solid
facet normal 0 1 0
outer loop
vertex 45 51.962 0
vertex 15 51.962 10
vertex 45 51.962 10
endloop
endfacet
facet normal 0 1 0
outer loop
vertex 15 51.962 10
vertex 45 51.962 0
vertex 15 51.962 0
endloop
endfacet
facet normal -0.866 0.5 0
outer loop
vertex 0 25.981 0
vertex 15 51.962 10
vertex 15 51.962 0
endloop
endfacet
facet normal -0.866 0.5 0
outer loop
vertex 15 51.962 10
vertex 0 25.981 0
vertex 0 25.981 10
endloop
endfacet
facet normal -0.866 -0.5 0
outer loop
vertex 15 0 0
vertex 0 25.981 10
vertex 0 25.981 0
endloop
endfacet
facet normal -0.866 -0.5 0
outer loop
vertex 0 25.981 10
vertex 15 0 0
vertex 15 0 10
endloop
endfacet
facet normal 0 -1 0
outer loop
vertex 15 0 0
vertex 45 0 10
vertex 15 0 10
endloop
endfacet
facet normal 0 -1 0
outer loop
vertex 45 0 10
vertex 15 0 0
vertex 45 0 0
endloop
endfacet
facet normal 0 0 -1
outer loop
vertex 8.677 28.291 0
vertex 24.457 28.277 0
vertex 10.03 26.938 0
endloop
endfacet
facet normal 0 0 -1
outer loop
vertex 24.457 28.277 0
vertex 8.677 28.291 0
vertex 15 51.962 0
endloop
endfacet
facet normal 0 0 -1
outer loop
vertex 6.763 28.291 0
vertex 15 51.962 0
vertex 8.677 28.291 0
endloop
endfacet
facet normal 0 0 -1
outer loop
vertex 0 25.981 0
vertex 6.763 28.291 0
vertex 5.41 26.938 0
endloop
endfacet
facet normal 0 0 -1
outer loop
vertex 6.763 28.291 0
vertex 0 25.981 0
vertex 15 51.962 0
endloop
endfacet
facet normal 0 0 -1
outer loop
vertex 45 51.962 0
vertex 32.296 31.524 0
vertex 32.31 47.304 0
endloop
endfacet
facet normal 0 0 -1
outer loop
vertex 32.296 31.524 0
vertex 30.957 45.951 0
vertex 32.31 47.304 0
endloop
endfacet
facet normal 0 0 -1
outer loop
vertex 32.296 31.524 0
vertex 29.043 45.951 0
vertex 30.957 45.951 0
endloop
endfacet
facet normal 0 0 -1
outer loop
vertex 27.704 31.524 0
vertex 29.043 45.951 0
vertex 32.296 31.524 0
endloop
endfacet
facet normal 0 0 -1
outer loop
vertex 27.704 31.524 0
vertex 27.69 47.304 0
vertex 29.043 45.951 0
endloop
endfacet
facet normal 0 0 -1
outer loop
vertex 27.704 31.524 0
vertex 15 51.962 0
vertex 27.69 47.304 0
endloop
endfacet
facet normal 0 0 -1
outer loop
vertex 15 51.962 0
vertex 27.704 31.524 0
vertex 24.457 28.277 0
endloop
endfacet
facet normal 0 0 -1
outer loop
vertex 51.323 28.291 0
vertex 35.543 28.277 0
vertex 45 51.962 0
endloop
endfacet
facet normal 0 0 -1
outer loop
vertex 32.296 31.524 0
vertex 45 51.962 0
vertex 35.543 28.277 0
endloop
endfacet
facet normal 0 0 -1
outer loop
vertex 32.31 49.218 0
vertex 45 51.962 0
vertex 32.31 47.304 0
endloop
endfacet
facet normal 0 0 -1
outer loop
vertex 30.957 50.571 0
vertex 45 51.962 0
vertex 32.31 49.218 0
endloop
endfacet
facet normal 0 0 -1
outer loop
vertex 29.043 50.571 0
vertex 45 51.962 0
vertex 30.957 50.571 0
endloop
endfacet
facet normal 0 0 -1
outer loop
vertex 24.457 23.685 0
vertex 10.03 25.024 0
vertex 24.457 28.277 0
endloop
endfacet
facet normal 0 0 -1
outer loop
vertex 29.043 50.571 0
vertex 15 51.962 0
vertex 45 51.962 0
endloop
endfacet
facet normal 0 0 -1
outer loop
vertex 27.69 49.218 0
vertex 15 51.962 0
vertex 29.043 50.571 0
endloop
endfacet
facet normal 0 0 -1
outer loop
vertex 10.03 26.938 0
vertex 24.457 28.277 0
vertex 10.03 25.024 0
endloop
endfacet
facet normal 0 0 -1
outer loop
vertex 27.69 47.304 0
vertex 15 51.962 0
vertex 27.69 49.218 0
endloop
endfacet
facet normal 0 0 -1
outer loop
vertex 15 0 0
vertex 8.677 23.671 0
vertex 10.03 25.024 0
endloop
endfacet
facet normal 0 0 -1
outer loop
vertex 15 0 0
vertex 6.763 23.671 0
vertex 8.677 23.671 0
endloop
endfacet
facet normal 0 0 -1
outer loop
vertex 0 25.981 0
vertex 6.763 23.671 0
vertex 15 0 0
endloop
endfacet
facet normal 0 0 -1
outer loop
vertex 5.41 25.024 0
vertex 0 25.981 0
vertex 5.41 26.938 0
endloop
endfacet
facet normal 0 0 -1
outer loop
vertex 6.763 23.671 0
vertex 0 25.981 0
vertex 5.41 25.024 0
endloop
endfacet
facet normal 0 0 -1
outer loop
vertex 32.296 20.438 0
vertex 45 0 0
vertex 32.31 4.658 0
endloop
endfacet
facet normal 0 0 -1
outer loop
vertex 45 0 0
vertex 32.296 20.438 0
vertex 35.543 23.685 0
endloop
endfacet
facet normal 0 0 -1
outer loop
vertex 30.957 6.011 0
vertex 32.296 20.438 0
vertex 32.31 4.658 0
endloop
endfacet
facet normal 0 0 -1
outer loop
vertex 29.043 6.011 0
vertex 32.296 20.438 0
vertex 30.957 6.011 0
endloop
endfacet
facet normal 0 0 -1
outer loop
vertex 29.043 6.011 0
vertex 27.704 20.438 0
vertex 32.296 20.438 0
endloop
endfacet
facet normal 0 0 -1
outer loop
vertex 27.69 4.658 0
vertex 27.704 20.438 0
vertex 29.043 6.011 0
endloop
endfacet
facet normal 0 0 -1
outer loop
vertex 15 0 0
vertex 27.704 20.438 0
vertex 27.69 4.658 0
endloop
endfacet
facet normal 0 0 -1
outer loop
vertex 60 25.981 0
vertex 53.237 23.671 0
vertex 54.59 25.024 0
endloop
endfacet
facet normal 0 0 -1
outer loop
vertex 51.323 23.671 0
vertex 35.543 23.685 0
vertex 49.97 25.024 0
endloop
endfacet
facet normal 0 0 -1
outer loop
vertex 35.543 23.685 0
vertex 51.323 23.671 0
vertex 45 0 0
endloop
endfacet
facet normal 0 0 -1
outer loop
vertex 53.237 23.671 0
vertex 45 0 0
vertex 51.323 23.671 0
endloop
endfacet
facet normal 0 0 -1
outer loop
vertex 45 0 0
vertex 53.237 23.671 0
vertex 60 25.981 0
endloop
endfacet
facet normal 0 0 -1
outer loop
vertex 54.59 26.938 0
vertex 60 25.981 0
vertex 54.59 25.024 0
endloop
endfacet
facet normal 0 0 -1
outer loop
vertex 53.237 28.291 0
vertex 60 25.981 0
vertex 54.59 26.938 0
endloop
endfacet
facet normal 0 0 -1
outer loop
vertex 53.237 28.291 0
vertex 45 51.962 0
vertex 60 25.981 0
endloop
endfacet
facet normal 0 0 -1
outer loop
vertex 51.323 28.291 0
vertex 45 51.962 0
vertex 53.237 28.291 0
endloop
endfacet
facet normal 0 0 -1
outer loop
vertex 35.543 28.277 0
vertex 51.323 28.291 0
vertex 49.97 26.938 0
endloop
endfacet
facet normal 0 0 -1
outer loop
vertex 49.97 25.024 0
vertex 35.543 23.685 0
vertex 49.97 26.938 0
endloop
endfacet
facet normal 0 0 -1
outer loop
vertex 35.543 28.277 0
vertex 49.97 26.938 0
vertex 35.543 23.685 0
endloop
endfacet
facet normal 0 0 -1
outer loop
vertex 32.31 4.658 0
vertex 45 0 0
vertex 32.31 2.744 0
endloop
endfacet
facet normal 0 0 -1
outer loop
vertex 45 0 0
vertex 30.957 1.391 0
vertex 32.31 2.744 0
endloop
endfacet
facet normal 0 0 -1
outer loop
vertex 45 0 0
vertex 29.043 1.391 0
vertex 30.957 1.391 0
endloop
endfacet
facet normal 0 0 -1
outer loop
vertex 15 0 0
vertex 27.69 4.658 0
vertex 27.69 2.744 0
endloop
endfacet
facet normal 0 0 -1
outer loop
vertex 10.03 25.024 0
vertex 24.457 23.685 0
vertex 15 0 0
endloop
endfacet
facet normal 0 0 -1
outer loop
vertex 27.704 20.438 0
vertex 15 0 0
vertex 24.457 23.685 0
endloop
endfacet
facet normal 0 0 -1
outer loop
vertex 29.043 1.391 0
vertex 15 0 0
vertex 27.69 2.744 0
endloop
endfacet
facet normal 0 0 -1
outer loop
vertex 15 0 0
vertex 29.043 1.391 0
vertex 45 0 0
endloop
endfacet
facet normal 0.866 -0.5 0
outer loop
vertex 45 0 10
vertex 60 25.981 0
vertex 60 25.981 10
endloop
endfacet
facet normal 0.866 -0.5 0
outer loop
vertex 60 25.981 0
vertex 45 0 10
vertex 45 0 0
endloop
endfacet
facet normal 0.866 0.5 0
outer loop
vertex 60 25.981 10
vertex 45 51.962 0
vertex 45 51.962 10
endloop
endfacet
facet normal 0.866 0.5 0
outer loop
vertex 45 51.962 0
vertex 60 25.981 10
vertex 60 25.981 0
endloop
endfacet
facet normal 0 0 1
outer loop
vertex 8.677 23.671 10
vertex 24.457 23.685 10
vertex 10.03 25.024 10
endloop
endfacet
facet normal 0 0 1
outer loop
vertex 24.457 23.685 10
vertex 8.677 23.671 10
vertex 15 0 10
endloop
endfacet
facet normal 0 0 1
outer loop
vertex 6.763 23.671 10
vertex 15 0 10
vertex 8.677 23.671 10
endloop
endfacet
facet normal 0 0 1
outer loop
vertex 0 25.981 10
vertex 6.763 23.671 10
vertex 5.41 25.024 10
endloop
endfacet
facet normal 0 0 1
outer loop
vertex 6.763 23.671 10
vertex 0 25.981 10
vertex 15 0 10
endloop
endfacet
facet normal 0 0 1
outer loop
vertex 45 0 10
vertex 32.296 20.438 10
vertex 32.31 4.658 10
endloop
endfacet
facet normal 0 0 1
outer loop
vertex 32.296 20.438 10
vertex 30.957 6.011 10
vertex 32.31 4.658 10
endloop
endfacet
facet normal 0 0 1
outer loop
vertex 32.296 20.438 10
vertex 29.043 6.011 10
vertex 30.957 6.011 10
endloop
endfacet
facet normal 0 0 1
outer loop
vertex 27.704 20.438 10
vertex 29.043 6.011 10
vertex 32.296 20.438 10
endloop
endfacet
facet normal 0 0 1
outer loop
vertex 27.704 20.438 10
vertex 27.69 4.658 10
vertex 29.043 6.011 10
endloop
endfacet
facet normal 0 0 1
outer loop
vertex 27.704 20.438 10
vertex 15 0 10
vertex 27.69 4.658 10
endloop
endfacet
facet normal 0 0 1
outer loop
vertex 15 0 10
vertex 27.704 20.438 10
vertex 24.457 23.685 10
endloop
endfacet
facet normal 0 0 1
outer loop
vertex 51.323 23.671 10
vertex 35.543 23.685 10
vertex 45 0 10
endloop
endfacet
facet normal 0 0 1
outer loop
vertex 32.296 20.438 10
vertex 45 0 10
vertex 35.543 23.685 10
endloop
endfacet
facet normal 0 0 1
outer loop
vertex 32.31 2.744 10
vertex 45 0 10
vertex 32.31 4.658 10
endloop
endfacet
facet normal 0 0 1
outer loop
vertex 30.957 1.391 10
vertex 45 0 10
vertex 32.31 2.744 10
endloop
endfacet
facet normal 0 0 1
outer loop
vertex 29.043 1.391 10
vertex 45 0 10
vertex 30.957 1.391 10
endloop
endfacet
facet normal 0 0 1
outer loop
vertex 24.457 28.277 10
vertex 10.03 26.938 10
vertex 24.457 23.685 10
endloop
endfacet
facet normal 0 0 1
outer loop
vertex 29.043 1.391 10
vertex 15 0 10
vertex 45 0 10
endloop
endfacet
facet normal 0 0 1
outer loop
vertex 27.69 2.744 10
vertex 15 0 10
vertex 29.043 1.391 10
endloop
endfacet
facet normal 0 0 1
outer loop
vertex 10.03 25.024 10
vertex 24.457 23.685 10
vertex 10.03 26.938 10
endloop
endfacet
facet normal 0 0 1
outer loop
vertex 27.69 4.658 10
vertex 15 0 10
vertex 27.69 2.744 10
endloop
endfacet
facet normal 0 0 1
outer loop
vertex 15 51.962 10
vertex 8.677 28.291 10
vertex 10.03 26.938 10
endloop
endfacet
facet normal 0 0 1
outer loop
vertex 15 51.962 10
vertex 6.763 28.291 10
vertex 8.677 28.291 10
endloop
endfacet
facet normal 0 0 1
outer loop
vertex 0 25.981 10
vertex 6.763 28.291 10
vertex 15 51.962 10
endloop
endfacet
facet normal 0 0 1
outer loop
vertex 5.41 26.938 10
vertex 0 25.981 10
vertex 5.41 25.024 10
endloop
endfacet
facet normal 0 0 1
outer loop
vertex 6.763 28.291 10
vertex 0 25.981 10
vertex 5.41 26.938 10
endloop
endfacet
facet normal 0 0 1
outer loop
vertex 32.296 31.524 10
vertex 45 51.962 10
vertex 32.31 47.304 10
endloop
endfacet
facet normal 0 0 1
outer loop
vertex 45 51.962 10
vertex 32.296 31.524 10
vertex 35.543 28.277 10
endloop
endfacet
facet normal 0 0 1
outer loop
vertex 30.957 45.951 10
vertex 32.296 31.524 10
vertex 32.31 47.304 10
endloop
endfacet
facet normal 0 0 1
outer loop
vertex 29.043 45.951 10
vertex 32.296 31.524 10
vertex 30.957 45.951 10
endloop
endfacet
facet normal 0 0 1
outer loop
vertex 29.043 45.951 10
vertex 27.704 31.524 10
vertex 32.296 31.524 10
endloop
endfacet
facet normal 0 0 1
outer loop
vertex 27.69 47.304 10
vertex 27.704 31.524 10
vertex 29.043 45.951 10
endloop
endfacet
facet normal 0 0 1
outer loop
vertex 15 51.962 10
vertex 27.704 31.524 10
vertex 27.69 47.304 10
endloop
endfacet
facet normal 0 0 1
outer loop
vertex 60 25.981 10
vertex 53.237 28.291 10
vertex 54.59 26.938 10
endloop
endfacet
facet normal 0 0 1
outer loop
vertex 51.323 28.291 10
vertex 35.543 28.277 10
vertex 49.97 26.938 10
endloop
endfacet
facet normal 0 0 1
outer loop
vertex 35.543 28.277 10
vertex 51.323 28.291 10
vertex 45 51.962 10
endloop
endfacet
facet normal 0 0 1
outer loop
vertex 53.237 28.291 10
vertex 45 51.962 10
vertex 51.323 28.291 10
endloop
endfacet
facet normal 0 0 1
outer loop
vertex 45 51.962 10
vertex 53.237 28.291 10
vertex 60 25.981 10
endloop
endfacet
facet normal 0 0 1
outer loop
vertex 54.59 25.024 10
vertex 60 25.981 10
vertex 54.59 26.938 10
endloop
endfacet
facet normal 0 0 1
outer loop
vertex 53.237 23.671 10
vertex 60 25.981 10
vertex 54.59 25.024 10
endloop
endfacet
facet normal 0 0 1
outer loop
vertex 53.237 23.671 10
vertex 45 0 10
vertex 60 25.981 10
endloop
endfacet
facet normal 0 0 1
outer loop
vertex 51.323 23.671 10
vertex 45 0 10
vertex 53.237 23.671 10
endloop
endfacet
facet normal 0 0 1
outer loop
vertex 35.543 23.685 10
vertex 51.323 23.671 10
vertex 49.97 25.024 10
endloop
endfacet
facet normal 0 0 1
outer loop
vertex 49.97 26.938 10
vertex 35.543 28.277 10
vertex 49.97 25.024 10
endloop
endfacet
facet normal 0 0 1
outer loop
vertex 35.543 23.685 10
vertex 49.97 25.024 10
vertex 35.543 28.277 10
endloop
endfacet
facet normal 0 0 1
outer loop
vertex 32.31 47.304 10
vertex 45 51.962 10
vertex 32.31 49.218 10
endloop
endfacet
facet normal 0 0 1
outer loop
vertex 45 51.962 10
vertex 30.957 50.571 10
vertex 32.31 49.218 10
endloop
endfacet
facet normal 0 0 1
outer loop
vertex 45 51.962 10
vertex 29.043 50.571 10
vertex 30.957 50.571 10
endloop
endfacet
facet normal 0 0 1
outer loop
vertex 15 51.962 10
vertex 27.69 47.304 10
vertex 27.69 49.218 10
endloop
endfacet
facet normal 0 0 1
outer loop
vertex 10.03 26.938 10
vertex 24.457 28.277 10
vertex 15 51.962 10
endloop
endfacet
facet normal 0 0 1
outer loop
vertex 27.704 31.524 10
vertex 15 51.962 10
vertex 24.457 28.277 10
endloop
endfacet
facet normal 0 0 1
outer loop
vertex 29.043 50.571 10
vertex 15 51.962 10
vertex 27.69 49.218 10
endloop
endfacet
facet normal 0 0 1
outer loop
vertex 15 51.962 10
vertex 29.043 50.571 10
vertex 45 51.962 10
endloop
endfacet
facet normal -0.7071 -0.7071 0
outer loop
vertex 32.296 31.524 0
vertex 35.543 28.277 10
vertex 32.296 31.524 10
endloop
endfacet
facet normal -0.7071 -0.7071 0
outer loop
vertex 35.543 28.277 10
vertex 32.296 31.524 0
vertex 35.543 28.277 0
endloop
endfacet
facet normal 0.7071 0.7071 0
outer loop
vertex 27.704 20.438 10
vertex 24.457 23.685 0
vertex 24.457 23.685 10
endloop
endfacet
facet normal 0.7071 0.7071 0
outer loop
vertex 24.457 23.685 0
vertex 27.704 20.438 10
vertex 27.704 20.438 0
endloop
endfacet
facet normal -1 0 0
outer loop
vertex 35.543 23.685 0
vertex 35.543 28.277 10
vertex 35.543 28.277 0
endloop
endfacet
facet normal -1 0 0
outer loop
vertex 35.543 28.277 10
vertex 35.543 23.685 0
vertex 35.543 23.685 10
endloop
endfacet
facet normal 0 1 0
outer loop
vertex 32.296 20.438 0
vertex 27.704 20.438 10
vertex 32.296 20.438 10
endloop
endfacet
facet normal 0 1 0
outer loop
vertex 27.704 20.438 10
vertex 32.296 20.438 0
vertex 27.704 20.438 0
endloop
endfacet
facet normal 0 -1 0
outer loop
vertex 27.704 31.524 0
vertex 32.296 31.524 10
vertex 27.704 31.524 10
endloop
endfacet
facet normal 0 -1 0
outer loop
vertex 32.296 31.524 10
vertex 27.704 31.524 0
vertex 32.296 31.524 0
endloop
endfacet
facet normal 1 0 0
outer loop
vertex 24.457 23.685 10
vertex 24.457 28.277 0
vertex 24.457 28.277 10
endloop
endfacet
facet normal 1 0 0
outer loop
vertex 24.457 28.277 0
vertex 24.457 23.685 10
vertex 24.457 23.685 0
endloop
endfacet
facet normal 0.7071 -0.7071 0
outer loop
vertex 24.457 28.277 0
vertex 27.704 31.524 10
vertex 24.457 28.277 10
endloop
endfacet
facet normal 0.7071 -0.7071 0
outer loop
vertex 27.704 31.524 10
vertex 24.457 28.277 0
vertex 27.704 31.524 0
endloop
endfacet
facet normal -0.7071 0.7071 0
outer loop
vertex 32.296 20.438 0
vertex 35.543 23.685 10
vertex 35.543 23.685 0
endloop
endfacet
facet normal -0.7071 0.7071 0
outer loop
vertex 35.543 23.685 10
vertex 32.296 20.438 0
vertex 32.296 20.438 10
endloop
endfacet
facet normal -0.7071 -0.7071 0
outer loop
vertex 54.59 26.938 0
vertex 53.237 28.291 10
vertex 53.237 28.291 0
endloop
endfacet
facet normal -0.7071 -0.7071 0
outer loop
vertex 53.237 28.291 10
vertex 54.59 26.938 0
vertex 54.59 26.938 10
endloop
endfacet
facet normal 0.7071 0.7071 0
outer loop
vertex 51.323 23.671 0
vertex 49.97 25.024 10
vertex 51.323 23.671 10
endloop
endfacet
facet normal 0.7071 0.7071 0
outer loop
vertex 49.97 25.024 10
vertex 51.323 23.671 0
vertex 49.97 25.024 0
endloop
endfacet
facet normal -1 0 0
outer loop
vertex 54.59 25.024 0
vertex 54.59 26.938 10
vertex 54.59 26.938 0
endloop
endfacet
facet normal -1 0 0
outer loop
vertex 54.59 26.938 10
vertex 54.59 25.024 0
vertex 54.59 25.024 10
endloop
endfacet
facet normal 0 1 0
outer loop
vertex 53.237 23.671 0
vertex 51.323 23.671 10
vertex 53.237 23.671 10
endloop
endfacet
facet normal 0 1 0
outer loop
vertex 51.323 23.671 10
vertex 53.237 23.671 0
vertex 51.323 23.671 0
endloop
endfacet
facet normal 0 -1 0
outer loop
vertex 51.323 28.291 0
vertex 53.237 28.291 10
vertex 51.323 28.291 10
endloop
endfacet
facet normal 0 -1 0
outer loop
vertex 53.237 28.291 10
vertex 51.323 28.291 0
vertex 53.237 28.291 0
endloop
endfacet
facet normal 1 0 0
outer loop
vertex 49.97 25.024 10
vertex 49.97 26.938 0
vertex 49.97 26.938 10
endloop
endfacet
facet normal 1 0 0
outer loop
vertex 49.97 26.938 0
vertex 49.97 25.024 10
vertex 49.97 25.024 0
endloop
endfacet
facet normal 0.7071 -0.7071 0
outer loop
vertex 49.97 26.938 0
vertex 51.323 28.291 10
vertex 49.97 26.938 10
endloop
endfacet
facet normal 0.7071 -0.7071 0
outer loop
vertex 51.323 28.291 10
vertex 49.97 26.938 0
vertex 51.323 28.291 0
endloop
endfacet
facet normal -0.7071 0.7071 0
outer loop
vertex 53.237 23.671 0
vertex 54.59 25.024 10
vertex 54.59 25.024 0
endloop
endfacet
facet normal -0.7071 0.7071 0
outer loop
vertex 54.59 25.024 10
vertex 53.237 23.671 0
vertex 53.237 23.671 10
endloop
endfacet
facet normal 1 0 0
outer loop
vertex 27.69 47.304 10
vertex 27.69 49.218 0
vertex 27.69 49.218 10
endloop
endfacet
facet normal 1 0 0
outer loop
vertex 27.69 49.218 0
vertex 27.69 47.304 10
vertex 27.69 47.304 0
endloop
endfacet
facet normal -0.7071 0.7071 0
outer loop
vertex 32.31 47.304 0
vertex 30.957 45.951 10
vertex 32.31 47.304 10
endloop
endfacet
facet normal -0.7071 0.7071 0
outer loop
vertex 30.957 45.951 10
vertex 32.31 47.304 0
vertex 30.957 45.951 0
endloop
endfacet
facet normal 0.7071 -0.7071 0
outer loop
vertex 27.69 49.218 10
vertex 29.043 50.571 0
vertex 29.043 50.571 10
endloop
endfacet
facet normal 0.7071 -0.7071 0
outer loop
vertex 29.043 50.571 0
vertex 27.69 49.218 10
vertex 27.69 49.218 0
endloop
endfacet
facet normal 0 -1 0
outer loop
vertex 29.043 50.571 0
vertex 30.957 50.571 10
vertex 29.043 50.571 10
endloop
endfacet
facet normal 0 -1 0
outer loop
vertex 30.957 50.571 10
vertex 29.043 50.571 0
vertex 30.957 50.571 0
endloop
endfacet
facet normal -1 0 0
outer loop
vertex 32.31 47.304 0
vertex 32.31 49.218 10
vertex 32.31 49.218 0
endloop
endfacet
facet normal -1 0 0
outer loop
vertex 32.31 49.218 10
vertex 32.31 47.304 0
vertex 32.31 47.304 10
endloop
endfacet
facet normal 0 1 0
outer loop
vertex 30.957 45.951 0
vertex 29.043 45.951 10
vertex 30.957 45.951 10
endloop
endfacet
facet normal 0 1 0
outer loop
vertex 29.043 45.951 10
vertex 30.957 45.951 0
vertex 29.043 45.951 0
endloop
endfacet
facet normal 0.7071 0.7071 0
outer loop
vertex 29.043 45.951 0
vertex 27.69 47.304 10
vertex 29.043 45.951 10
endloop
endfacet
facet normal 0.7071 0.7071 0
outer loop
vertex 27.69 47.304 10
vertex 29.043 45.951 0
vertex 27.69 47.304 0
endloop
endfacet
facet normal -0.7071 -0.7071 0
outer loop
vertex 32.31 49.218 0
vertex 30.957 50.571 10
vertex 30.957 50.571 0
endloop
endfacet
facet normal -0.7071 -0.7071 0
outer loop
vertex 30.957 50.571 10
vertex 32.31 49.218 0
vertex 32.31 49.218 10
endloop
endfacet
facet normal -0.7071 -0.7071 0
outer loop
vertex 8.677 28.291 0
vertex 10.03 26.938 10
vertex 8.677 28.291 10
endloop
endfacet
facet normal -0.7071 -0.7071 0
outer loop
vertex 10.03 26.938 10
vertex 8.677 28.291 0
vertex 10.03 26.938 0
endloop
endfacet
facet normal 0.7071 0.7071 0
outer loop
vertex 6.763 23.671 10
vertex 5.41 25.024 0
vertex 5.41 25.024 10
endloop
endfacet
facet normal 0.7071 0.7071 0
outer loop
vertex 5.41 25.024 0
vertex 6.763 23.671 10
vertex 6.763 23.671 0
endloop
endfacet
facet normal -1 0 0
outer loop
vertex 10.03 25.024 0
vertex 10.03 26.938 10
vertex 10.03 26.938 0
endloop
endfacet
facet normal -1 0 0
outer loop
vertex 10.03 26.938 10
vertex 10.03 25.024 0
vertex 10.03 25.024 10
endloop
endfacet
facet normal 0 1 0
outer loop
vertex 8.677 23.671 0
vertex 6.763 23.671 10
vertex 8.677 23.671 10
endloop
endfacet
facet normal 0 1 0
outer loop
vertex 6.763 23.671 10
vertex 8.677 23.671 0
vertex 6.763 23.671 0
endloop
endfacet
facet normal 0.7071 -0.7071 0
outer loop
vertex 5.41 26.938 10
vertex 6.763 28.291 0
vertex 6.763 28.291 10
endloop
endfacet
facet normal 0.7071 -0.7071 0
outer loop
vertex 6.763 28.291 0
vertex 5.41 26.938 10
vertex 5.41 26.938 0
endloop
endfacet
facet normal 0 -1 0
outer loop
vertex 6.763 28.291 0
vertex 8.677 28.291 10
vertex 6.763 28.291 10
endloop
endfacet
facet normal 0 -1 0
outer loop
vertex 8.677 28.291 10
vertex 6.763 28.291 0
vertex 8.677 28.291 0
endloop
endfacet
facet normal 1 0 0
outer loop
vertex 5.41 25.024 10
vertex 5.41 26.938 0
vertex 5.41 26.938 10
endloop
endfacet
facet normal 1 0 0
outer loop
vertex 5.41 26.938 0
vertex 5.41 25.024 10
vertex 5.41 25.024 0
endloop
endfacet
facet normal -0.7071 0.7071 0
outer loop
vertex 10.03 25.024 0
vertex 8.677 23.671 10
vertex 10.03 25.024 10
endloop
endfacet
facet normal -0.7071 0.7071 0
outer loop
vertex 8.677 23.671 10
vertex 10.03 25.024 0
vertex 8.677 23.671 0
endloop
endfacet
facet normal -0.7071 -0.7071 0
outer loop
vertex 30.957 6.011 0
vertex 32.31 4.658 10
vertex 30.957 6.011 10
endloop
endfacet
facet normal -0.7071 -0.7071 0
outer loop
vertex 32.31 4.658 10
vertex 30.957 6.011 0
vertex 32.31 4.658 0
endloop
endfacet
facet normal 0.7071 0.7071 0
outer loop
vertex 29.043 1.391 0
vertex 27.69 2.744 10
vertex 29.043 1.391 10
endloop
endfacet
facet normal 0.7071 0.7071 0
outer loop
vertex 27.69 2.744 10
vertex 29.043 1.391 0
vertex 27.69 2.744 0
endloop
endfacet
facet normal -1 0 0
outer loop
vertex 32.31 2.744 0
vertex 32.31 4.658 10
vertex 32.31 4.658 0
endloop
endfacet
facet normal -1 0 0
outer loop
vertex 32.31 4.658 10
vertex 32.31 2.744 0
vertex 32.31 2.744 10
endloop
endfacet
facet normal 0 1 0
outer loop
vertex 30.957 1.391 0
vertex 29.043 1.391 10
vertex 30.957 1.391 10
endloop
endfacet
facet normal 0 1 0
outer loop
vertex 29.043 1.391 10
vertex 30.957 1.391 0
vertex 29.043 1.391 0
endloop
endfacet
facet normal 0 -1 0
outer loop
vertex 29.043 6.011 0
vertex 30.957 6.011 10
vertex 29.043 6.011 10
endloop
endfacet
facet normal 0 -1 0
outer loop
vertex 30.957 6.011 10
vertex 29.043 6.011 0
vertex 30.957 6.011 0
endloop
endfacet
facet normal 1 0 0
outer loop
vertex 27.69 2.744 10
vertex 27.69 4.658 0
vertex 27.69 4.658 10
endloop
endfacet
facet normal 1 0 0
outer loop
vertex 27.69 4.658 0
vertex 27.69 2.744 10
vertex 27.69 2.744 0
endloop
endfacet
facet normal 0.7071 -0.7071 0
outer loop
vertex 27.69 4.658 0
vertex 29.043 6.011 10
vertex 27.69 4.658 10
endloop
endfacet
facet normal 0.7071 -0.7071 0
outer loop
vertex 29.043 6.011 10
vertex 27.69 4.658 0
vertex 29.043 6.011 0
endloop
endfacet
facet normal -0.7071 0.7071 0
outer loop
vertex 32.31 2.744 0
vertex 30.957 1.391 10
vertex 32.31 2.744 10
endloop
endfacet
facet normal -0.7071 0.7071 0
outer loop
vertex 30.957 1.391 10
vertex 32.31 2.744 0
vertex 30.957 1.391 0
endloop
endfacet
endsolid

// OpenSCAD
$fn = 32;

// ----------------------------------------------------------------------
// Polygon plate: 6-gon R30, 4 bolt windows
// ----------------------------------------------------------------------

// --- parameters (mm) ---
sides = 6;                // number of polygon sides
plate_r = 30;             // circumscribed radius of the polygon
bore_r = 6;               // centre bore radius
bolts = 4;                // number of bolt windows
ring_r = 22.28;           // bolt-circle radius
bolt_r = 2.5;             // bolt window radius
plate_t = 10;             // plate thickness, Z (extrusion height)

plate_d = 2 * plate_r;  // circumscribed diameter
bore_d = 2 * bore_r;  // centre bore diameter
bolt_d = 2 * bolt_r;  // bolt window diameter
ring_d = 2 * ring_r;  // bolt-circle diameter

profile = [[60, 25.981], [45, 51.962], [15, 51.962], [0, 25.981], [15, 0], [45, 0]];  // primary outline, 6 points, counter clockwise
void_1 = [[35.543, 28.277], [32.296, 31.524], [27.704, 31.524], [24.457, 28.277], [24.457, 23.685], [27.704, 20.438], [32.296, 20.438], [35.543, 23.685]];  // centre bore, 8 points
void_2 = [[54.59, 26.938], [53.237, 28.291], [51.323, 28.291], [49.97, 26.938], [49.97, 25.024], [51.323, 23.671], [53.237, 23.671], [54.59, 25.024]];  // bolt window 1, 8 points
void_3 = [[32.31, 49.218], [30.957, 50.571], [29.043, 50.571], [27.69, 49.218], [27.69, 47.304], [29.043, 45.951], [30.957, 45.951], [32.31, 47.304]];  // bolt window 2, 8 points
void_4 = [[10.03, 26.938], [8.677, 28.291], [6.763, 28.291], [5.41, 26.938], [5.41, 25.024], [6.763, 23.671], [8.677, 23.671], [10.03, 25.024]];  // bolt window 3, 8 points
void_5 = [[32.31, 4.658], [30.957, 6.011], [29.043, 6.011], [27.69, 4.658], [27.69, 2.744], [29.043, 1.391], [30.957, 1.391], [32.31, 2.744]];  // bolt window 4, 8 points

// --- the one profile operation ---
difference() {
  linear_extrude(height = plate_t) polygon(points = profile);
  translate([0, 0, -1])
    linear_extrude(height = plate_t + 2) polygon(points = void_1);
  translate([0, 0, -1])
    linear_extrude(height = plate_t + 2) polygon(points = void_2);
  translate([0, 0, -1])
    linear_extrude(height = plate_t + 2) polygon(points = void_3);
  translate([0, 0, -1])
    linear_extrude(height = plate_t + 2) polygon(points = void_4);
  translate([0, 0, -1])
    linear_extrude(height = plate_t + 2) polygon(points = void_5);
}
